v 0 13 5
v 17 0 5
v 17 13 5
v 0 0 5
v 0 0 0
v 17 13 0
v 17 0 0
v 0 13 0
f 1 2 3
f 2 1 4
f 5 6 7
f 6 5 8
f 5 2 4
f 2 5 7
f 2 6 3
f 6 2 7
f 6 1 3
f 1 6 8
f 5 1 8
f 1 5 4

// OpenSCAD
// Generated by SolidPython 1.0.1 on 2020-07-29 00:46:56


cube(size = [17, 13, 5]);
/***********************************************
*********      SolidPython code:      **********
************************************************
 
# import packages: SolidPython
from solid import *
from solid.utils import *
from itertools import chain, combinations, permutations


class Resize:

    def __init__(self, scad_file):
        self.scad_file = scad_file
        #self.scad_file = import_scad(scad_file)
        # cone/cylinder param:
        self.r1 = 0
        self.r2 = 0
        self.h = 0
        # rectangular prism param:
        self.w = 0
        self.l = 0
        # ellipse param:
        self.r = 0

    # import OpenScad code (file name corresponds to shape)


    # classify shape + parameters
    def assign(self, param1, param2, param3):
        if self.scad_file == 'cone.scad':
            self.r1 = param1
            self.r2 = param2
            self.h = param3
        elif self.scad_file == 'cylinder.scad':
            self.r1 = param1
            self.r2 = param2
            self.h = param3
        elif self.scad_file == 'rectangularPrism.scad':
            self.h = param1
            self.l = param2
            self.w = param3
        else:
            self.r = param1
            self.h = param2

    # resize parameters
    def iterate(self):
        x = range(3, 20, 2)
        i = 1
        if self.scad_file == 'cone.scad':
            tempList = list(permutations(x, 2))
            for temp in tempList:
                param1 = temp[0]
                param2 = temp[1]
                filepath = 'produced_scad_files/' + 'cone' + str(param1) + '_' + str(param2) + '_' + '.scad'
                scad_render_to_file(cylinder(h=param1, r1=param2, r2=0), filepath)

        elif self.scad_file == 'cylinder.scad':
            tempList = list(permutations(x, 3))
            for temp in tempList:
                param1 = temp[0]
                param2 = temp[1]
                filepath = 'produced_scad_files/' + 'cylinder' + str(param1) + '_' + str(param2) + '_' + '.scad'
                scad_render_to_file(cylinder(h=param1, r1=param2, r2=param2), filepath)

        elif self.scad_file == 'rectangularPrism.scad':
            tempList = list(permutations(x, 3))
            for temp in tempList:
                param1 = temp[0]
                param2 = temp[1]
                param3 = temp[2]
                filepath = 'produced_scad_files/' + 'rectangularPrism' + str(param1) + '_' + str(param2) + '_' + str(
                    param3) + '.scad'
                scad_render_to_file(cube(size=(param1, param2, param3)), filepath)

        elif self.scad_file == 'ellipse.scad':
            tempList = list(permutations(x, 4))
            for temp in tempList:
                param1 = temp[0]
                param2 = temp[1]
                param3 = temp[2]
                param4 = temp[3]
                filepath = 'produced_scad_files/' + 'ellipse' + str(param1) + '_' + str(param2) + '_' + str(param3) + '_' + str(param4) + '.scad'
                scad_render_to_file(scale([param1, param2, param3])(sphere(r=param4)), filepath)

    def render_to_scadfile(self):
        scad_render_to_file(scad, 'example.scad') 
 
************************************************/
